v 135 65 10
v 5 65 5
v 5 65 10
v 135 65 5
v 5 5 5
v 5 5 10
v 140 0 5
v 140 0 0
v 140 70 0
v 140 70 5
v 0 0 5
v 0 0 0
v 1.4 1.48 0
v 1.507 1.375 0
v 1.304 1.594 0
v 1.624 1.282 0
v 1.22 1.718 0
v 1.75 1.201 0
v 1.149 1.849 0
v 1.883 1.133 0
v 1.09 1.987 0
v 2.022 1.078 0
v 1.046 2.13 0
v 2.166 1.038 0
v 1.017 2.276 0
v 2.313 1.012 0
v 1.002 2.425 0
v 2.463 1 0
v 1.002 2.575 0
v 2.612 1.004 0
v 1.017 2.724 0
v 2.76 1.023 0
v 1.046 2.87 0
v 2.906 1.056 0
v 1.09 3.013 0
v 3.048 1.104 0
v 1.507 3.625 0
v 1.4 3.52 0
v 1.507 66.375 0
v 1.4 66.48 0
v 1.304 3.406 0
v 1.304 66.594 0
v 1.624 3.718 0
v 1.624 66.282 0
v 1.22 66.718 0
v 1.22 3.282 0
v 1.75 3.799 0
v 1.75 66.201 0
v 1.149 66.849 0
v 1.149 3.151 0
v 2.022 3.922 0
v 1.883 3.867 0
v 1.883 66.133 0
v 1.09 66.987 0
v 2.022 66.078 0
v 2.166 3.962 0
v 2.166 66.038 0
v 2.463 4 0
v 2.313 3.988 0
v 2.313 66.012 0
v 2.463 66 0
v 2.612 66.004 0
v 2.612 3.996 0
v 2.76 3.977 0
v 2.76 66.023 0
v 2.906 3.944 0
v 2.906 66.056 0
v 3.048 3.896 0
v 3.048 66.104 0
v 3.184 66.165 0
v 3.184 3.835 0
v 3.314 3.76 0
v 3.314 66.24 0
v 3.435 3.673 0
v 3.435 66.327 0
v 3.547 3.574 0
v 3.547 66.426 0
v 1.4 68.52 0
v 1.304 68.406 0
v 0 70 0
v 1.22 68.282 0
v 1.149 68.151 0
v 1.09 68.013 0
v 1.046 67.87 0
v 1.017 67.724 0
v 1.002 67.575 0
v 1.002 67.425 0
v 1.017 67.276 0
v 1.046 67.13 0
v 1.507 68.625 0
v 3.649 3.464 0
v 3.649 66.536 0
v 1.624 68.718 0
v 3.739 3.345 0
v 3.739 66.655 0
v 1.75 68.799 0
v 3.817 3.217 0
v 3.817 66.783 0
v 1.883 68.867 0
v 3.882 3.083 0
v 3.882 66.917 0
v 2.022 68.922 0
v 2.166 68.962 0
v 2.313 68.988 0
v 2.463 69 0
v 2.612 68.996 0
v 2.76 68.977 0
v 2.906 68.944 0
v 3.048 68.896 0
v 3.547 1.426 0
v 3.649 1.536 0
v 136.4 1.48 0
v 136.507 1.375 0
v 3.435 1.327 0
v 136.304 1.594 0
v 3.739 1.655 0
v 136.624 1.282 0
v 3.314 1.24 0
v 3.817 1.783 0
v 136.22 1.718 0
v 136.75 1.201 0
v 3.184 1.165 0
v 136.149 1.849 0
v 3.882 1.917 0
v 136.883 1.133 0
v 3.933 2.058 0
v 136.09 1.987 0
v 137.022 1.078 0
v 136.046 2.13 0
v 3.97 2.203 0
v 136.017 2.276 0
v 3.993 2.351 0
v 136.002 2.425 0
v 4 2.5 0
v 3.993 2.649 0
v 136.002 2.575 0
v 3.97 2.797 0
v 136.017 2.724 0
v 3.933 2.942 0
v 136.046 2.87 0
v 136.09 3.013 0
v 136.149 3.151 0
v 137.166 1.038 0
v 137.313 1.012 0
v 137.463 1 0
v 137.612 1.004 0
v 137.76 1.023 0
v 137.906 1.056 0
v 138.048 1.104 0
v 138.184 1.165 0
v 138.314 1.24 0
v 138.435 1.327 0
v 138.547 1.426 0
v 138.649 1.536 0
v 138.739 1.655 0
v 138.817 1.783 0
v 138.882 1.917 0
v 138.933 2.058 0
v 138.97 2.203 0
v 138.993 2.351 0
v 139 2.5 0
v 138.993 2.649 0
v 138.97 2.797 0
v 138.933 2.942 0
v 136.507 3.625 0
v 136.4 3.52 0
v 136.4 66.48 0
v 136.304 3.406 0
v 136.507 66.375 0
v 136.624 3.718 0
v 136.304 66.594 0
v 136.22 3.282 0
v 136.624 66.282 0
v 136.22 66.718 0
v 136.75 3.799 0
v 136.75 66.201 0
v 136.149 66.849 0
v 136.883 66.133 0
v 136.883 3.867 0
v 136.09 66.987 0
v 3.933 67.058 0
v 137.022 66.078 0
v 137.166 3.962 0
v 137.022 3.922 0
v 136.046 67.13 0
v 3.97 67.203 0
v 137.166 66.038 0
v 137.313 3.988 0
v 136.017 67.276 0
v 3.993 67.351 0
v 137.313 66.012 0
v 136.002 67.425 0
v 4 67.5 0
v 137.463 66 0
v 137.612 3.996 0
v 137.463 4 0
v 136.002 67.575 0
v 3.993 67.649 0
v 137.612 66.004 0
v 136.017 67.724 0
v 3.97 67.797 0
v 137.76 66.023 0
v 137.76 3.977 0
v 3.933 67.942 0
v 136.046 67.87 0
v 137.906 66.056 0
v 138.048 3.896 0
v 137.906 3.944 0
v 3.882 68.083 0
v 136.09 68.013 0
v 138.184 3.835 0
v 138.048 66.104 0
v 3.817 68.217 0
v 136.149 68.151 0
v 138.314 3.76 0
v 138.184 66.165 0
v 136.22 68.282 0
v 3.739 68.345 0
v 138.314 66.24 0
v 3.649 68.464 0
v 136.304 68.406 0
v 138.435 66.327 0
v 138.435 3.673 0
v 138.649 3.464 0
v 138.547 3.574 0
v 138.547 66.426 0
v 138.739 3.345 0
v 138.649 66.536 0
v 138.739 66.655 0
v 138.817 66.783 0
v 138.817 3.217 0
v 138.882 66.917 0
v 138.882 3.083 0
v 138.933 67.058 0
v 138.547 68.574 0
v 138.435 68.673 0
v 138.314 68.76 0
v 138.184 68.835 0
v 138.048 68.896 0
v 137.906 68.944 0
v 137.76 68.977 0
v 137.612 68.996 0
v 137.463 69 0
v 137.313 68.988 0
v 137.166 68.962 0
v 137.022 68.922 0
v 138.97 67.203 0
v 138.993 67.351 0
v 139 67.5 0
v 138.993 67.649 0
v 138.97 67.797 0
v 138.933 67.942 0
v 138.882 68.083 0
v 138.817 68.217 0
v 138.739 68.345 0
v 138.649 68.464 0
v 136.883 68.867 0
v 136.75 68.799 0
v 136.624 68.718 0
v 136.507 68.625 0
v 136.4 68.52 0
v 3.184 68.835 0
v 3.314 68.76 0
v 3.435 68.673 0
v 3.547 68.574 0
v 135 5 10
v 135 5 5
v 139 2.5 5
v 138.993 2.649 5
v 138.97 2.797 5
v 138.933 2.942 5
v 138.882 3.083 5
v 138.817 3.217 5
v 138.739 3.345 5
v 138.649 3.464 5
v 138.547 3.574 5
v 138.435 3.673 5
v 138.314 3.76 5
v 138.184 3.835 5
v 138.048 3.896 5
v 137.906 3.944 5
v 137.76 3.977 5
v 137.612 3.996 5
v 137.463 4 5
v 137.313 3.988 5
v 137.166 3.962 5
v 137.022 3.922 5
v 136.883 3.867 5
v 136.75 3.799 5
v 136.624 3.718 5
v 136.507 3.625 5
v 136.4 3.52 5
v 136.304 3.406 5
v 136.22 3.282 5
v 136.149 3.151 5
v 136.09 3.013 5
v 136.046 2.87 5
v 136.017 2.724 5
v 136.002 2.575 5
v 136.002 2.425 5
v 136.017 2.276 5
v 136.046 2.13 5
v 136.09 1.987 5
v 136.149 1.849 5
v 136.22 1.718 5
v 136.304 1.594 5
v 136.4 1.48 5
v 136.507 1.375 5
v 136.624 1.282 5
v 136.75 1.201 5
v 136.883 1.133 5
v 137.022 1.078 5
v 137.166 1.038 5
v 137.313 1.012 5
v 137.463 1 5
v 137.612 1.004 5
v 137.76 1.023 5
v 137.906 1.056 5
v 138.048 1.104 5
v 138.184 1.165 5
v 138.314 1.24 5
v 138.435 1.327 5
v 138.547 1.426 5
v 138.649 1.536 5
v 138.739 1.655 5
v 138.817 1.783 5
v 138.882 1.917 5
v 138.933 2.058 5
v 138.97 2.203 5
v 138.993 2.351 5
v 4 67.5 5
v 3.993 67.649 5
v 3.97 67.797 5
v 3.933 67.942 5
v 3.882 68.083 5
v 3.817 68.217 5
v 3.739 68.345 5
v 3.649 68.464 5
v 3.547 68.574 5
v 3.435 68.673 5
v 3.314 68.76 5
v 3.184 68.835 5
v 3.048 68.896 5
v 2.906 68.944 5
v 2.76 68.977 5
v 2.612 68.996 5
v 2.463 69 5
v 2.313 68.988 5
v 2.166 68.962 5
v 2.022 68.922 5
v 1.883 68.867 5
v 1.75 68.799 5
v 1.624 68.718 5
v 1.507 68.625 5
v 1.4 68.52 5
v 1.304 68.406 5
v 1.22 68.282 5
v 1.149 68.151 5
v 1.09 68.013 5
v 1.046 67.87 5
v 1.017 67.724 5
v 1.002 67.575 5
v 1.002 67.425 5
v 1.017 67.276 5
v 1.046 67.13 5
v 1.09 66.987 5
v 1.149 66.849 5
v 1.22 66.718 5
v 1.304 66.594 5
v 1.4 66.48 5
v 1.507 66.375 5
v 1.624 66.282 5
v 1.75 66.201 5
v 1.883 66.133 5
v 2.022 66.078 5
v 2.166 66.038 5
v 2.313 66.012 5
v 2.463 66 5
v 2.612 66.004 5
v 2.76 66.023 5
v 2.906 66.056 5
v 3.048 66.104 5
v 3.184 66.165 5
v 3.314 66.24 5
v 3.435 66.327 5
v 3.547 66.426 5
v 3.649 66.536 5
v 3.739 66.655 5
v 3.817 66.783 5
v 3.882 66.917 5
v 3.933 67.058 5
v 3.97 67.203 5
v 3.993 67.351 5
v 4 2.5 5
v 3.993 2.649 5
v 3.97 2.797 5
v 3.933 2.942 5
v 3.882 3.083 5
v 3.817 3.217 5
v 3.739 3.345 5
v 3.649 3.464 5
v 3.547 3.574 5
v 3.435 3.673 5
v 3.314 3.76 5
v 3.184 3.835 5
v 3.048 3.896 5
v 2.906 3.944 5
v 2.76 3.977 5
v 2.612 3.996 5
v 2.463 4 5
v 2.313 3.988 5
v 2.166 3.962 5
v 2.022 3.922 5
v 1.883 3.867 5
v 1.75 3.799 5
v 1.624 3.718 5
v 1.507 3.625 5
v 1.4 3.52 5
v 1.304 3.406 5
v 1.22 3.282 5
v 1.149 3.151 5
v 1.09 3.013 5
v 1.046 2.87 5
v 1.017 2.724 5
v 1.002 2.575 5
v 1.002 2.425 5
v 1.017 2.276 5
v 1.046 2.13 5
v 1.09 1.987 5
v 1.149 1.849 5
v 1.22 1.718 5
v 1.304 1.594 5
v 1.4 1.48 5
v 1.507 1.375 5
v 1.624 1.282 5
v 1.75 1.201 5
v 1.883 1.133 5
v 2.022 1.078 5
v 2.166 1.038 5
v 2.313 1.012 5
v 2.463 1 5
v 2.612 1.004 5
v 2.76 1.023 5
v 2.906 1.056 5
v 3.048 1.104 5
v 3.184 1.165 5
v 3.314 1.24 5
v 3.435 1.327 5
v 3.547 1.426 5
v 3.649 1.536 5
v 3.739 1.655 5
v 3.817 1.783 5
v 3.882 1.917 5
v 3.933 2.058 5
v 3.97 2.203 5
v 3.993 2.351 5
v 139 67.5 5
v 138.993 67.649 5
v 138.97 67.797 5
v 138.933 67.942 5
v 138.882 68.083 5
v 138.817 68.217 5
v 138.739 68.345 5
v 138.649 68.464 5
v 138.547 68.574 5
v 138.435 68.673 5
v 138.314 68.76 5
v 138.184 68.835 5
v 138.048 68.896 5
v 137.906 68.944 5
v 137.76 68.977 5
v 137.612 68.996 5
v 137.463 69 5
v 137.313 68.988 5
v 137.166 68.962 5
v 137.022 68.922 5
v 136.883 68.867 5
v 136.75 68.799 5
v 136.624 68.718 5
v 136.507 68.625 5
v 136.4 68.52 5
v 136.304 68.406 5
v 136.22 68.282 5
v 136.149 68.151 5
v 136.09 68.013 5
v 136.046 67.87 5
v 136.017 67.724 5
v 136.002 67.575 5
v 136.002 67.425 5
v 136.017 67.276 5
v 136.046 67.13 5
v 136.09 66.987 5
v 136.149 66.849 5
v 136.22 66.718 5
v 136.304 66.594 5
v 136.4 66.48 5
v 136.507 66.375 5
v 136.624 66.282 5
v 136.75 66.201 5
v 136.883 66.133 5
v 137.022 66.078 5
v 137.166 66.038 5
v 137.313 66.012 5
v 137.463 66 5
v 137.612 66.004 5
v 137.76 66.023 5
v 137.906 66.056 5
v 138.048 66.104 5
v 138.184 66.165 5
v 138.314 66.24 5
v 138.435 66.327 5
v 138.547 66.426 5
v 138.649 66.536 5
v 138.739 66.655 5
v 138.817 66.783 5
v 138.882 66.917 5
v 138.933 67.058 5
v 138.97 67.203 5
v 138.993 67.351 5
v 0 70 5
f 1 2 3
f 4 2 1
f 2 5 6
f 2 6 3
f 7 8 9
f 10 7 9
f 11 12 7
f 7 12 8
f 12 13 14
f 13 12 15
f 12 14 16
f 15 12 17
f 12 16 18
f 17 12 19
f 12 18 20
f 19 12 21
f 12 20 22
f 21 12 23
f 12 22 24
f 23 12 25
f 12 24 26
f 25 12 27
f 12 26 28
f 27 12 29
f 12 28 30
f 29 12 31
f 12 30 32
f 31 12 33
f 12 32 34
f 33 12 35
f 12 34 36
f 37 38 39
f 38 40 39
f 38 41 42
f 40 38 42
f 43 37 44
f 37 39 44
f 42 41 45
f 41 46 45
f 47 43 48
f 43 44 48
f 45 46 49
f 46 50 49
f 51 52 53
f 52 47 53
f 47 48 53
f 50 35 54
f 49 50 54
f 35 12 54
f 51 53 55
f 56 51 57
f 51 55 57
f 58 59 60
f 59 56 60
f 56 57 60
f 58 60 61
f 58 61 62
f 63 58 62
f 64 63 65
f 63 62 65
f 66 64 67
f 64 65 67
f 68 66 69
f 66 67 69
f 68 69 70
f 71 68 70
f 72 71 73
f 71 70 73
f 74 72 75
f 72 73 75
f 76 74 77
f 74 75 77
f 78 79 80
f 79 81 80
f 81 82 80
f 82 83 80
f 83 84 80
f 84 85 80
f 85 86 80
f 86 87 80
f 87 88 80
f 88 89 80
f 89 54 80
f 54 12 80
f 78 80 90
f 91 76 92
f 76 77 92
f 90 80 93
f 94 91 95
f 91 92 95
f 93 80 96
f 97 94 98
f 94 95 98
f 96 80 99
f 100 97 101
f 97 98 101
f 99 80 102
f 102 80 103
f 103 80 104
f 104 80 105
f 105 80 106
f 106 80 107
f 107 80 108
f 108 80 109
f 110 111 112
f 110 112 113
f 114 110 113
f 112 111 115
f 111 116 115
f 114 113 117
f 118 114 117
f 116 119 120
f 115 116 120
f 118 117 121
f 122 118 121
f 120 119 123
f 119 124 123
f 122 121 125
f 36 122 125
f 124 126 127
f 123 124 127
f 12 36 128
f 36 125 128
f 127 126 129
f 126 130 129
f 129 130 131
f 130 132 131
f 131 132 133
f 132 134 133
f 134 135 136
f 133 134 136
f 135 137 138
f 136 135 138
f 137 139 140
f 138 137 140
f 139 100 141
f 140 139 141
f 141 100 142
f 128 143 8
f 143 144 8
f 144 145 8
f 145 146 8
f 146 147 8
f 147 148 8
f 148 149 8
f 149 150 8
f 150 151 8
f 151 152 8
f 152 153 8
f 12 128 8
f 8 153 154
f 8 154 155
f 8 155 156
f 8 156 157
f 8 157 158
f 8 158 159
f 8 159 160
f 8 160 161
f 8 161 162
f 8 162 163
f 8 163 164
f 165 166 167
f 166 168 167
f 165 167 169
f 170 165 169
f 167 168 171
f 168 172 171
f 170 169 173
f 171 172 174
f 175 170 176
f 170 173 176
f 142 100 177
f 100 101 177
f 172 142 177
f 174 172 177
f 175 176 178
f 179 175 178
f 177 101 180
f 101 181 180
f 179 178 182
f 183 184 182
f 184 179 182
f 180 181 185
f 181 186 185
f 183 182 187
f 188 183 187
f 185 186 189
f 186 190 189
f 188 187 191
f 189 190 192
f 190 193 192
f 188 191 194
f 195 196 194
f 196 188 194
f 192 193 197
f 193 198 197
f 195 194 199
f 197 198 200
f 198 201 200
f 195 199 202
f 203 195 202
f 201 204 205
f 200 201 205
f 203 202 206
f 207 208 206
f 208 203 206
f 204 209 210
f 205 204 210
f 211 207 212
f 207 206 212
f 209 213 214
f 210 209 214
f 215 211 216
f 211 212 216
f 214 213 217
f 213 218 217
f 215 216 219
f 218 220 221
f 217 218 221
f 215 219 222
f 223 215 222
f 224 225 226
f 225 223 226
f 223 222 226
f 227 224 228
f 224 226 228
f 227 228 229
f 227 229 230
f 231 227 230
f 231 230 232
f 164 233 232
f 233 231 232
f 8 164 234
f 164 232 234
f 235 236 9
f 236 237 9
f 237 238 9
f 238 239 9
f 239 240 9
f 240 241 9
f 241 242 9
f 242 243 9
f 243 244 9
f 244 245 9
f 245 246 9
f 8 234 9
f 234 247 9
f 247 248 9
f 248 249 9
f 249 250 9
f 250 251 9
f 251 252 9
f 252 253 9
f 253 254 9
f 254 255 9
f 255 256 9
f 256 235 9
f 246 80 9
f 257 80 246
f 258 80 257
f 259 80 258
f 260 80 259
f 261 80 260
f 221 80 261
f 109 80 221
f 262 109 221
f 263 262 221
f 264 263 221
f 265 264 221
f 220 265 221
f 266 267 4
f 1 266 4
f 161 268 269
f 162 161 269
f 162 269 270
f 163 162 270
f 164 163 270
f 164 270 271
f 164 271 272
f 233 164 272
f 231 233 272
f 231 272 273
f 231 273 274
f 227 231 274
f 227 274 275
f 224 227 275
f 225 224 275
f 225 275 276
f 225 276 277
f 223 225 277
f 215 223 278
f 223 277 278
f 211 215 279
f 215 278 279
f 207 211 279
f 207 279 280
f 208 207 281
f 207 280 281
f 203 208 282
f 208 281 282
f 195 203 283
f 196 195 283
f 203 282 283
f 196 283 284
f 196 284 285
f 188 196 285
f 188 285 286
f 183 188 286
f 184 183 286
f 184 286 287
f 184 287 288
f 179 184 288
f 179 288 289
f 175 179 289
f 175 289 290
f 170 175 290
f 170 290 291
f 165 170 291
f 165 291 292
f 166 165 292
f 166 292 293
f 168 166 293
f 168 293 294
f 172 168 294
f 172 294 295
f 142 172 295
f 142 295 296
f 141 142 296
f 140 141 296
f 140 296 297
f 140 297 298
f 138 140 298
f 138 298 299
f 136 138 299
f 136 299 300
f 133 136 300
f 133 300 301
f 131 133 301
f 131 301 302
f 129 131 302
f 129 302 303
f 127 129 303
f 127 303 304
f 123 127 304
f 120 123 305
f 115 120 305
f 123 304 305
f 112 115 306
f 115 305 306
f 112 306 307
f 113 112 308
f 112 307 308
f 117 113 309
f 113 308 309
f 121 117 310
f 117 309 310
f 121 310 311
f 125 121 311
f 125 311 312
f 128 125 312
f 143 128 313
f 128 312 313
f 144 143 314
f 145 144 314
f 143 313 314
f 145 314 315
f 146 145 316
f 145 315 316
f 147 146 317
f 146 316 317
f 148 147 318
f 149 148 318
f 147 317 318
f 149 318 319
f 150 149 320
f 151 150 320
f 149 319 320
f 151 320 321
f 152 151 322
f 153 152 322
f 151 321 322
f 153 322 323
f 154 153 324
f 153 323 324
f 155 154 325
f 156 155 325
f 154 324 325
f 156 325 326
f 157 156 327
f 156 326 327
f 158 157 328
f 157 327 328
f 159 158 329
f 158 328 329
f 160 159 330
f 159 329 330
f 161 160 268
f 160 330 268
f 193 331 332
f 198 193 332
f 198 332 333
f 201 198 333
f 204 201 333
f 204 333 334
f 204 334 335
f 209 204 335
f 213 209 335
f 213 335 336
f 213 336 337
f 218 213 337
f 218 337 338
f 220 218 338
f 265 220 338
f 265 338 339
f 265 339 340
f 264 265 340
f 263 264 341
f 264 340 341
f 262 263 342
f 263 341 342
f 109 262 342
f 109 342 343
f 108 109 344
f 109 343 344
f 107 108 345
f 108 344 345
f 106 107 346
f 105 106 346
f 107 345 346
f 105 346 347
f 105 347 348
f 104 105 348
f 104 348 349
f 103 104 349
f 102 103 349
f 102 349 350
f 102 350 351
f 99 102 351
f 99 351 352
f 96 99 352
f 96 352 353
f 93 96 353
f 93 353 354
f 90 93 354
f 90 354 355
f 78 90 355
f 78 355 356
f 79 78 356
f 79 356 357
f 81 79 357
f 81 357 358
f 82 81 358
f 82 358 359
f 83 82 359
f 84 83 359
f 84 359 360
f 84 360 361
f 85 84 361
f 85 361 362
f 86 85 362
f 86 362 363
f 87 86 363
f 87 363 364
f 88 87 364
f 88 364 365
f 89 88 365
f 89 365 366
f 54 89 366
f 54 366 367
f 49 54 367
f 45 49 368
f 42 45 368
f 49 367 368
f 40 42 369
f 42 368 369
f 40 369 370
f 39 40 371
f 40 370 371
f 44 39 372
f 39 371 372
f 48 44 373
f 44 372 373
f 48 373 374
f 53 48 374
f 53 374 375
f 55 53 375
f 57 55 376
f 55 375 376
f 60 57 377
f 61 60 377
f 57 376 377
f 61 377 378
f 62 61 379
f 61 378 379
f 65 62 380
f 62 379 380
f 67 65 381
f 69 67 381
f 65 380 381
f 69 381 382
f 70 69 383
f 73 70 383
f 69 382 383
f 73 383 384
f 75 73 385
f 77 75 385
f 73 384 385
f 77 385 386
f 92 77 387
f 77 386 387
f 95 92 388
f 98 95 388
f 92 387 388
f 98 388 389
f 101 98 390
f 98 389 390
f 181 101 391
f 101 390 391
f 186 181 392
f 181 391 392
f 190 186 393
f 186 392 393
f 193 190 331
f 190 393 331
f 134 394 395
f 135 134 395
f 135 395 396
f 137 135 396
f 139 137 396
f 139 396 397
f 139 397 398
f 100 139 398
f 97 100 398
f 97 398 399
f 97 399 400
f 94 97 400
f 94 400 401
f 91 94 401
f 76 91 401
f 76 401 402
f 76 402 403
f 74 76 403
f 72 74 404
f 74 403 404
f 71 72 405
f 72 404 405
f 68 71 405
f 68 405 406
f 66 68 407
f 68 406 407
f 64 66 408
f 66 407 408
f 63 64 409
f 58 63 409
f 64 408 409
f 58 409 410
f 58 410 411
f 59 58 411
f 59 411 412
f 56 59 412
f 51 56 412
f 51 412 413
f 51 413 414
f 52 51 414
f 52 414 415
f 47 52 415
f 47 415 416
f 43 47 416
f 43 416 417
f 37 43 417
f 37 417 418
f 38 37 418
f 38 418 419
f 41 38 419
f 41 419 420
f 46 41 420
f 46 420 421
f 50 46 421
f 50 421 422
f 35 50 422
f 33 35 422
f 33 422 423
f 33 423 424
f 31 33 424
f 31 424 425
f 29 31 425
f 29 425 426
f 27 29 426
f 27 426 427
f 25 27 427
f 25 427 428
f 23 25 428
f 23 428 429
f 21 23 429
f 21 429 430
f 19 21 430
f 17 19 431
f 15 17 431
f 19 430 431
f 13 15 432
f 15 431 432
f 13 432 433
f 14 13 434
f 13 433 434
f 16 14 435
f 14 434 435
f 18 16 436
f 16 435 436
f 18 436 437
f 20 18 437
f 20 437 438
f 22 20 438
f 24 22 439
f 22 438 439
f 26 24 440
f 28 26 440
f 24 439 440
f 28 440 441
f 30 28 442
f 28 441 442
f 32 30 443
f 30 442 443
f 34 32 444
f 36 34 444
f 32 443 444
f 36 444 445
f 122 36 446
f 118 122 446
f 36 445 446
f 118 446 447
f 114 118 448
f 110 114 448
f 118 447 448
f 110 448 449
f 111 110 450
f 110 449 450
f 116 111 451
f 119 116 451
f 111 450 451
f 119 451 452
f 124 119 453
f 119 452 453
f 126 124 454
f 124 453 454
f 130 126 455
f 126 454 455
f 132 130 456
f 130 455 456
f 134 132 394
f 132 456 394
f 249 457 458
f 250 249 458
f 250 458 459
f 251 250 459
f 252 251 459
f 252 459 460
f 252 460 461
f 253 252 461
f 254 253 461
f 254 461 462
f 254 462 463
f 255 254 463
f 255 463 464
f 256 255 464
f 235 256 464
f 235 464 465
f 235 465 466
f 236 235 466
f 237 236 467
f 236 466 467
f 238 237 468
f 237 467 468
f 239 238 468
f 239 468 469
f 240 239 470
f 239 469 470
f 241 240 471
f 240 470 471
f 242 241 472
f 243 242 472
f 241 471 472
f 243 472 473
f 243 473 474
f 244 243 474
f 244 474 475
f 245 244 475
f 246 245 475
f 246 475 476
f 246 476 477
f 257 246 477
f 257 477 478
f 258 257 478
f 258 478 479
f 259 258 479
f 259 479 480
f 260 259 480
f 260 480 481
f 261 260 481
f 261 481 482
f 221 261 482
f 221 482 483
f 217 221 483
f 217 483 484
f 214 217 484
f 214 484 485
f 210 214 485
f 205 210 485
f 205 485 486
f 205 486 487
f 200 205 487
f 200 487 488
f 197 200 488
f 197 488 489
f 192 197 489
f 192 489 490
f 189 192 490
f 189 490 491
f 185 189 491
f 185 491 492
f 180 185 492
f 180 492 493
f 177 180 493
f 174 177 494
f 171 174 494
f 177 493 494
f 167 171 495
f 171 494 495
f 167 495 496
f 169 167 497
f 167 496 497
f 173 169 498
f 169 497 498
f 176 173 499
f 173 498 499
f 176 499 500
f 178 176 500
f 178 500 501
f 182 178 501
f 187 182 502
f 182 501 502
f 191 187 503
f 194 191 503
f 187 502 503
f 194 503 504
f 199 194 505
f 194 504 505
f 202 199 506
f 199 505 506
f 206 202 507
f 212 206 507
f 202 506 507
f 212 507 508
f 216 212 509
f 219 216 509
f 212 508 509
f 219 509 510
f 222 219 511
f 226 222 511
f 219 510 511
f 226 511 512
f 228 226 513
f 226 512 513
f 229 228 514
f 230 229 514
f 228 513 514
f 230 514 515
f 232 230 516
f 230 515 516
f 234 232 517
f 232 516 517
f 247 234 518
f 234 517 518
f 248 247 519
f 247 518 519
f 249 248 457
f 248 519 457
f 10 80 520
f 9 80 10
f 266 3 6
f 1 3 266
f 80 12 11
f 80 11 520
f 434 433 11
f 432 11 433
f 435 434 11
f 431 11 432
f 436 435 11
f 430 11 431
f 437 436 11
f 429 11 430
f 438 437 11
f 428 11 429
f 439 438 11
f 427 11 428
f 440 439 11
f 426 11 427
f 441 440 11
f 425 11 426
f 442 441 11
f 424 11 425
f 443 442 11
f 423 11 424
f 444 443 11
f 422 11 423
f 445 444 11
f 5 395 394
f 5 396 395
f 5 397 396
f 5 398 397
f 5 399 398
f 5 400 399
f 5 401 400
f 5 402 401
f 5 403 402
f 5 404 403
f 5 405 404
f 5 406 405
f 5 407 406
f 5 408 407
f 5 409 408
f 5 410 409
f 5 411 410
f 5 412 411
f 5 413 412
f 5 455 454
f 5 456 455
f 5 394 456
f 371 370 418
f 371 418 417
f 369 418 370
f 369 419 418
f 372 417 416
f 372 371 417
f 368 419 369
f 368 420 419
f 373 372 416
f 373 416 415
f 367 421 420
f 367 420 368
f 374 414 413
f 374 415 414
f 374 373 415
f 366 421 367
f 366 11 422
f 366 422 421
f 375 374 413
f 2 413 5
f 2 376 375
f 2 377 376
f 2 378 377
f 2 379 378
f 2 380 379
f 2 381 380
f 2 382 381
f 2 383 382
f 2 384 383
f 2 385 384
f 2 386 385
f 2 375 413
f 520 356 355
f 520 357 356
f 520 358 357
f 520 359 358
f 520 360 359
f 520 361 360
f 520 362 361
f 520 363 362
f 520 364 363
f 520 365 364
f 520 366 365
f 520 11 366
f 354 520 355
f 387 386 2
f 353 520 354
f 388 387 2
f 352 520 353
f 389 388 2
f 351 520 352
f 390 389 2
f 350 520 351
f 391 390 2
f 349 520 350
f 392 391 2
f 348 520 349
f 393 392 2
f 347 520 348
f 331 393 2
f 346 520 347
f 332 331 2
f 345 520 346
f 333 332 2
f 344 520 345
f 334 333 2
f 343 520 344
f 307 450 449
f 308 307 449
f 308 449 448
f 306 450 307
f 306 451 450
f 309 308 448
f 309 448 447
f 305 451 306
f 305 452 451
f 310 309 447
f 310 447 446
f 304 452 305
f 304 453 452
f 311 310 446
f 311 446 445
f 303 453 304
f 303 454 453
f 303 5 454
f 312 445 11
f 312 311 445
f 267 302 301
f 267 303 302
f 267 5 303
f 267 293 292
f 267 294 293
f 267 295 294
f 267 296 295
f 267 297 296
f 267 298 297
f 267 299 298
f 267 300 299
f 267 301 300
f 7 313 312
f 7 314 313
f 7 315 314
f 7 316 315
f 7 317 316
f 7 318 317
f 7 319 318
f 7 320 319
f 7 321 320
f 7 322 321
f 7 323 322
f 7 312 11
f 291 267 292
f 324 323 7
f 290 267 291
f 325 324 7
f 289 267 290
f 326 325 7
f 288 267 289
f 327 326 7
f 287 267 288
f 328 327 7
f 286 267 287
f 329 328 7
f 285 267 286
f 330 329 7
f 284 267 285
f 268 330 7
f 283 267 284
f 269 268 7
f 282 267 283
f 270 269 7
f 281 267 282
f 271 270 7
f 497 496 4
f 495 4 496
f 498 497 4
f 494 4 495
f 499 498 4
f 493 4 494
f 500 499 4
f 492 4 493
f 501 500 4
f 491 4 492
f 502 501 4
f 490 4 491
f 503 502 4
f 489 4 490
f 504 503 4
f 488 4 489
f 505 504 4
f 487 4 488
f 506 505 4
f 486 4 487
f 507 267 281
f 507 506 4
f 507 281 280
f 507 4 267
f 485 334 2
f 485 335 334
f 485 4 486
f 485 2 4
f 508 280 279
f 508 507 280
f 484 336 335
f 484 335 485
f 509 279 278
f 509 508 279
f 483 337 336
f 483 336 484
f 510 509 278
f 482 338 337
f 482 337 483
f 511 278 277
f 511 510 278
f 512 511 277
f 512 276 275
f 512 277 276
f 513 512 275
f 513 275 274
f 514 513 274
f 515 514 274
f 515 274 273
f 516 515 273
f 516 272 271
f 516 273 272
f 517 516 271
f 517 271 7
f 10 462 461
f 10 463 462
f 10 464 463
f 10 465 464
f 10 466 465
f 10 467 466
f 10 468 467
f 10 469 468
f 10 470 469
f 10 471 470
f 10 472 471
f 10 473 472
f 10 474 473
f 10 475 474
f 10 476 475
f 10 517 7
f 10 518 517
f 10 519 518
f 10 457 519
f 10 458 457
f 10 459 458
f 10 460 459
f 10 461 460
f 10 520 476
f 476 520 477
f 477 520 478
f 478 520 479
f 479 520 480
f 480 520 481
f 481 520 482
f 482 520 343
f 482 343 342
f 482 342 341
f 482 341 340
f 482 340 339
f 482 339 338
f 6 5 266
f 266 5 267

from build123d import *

# Parameters (mm, degrees)
SKETCH1_W            = 140
SKETCH1_H            = 70
BOSS_EXTRUDE1_DEPTH  = 5
SKETCH2_W            = 130
SKETCH2_H            = 60
BOSS_EXTRUDE2_DEPTH  = 5
M3_CLEARANCE_HOLE1_D = 3


with BuildPart() as part:
    # Sketch1 → Boss-Extrude1 (new body)
    with BuildSketch(Plane.XY):
        with Locations((70, 35)):
            Rectangle(SKETCH1_W, SKETCH1_H)
    extrude(amount=BOSS_EXTRUDE1_DEPTH)

    # Sketch2 → Boss-Extrude2 (add)
    with BuildSketch(Plane.XY.offset(5)):
        with Locations((70, 35)):
            Rectangle(SKETCH2_W, SKETCH2_H)
    extrude(amount=BOSS_EXTRUDE2_DEPTH)

    # M3 Clearance Hole1 (through all)
    with Locations(Plane(origin=(137.5, 2.5, 0), x_dir=(-1, 0, 0), z_dir=(0, 0, -1))):
        with Locations((0, 0), (0, 65), (135, 0), (135, 65)):
            Hole(M3_CLEARANCE_HOLE1_D / 2)


solid = part.part
